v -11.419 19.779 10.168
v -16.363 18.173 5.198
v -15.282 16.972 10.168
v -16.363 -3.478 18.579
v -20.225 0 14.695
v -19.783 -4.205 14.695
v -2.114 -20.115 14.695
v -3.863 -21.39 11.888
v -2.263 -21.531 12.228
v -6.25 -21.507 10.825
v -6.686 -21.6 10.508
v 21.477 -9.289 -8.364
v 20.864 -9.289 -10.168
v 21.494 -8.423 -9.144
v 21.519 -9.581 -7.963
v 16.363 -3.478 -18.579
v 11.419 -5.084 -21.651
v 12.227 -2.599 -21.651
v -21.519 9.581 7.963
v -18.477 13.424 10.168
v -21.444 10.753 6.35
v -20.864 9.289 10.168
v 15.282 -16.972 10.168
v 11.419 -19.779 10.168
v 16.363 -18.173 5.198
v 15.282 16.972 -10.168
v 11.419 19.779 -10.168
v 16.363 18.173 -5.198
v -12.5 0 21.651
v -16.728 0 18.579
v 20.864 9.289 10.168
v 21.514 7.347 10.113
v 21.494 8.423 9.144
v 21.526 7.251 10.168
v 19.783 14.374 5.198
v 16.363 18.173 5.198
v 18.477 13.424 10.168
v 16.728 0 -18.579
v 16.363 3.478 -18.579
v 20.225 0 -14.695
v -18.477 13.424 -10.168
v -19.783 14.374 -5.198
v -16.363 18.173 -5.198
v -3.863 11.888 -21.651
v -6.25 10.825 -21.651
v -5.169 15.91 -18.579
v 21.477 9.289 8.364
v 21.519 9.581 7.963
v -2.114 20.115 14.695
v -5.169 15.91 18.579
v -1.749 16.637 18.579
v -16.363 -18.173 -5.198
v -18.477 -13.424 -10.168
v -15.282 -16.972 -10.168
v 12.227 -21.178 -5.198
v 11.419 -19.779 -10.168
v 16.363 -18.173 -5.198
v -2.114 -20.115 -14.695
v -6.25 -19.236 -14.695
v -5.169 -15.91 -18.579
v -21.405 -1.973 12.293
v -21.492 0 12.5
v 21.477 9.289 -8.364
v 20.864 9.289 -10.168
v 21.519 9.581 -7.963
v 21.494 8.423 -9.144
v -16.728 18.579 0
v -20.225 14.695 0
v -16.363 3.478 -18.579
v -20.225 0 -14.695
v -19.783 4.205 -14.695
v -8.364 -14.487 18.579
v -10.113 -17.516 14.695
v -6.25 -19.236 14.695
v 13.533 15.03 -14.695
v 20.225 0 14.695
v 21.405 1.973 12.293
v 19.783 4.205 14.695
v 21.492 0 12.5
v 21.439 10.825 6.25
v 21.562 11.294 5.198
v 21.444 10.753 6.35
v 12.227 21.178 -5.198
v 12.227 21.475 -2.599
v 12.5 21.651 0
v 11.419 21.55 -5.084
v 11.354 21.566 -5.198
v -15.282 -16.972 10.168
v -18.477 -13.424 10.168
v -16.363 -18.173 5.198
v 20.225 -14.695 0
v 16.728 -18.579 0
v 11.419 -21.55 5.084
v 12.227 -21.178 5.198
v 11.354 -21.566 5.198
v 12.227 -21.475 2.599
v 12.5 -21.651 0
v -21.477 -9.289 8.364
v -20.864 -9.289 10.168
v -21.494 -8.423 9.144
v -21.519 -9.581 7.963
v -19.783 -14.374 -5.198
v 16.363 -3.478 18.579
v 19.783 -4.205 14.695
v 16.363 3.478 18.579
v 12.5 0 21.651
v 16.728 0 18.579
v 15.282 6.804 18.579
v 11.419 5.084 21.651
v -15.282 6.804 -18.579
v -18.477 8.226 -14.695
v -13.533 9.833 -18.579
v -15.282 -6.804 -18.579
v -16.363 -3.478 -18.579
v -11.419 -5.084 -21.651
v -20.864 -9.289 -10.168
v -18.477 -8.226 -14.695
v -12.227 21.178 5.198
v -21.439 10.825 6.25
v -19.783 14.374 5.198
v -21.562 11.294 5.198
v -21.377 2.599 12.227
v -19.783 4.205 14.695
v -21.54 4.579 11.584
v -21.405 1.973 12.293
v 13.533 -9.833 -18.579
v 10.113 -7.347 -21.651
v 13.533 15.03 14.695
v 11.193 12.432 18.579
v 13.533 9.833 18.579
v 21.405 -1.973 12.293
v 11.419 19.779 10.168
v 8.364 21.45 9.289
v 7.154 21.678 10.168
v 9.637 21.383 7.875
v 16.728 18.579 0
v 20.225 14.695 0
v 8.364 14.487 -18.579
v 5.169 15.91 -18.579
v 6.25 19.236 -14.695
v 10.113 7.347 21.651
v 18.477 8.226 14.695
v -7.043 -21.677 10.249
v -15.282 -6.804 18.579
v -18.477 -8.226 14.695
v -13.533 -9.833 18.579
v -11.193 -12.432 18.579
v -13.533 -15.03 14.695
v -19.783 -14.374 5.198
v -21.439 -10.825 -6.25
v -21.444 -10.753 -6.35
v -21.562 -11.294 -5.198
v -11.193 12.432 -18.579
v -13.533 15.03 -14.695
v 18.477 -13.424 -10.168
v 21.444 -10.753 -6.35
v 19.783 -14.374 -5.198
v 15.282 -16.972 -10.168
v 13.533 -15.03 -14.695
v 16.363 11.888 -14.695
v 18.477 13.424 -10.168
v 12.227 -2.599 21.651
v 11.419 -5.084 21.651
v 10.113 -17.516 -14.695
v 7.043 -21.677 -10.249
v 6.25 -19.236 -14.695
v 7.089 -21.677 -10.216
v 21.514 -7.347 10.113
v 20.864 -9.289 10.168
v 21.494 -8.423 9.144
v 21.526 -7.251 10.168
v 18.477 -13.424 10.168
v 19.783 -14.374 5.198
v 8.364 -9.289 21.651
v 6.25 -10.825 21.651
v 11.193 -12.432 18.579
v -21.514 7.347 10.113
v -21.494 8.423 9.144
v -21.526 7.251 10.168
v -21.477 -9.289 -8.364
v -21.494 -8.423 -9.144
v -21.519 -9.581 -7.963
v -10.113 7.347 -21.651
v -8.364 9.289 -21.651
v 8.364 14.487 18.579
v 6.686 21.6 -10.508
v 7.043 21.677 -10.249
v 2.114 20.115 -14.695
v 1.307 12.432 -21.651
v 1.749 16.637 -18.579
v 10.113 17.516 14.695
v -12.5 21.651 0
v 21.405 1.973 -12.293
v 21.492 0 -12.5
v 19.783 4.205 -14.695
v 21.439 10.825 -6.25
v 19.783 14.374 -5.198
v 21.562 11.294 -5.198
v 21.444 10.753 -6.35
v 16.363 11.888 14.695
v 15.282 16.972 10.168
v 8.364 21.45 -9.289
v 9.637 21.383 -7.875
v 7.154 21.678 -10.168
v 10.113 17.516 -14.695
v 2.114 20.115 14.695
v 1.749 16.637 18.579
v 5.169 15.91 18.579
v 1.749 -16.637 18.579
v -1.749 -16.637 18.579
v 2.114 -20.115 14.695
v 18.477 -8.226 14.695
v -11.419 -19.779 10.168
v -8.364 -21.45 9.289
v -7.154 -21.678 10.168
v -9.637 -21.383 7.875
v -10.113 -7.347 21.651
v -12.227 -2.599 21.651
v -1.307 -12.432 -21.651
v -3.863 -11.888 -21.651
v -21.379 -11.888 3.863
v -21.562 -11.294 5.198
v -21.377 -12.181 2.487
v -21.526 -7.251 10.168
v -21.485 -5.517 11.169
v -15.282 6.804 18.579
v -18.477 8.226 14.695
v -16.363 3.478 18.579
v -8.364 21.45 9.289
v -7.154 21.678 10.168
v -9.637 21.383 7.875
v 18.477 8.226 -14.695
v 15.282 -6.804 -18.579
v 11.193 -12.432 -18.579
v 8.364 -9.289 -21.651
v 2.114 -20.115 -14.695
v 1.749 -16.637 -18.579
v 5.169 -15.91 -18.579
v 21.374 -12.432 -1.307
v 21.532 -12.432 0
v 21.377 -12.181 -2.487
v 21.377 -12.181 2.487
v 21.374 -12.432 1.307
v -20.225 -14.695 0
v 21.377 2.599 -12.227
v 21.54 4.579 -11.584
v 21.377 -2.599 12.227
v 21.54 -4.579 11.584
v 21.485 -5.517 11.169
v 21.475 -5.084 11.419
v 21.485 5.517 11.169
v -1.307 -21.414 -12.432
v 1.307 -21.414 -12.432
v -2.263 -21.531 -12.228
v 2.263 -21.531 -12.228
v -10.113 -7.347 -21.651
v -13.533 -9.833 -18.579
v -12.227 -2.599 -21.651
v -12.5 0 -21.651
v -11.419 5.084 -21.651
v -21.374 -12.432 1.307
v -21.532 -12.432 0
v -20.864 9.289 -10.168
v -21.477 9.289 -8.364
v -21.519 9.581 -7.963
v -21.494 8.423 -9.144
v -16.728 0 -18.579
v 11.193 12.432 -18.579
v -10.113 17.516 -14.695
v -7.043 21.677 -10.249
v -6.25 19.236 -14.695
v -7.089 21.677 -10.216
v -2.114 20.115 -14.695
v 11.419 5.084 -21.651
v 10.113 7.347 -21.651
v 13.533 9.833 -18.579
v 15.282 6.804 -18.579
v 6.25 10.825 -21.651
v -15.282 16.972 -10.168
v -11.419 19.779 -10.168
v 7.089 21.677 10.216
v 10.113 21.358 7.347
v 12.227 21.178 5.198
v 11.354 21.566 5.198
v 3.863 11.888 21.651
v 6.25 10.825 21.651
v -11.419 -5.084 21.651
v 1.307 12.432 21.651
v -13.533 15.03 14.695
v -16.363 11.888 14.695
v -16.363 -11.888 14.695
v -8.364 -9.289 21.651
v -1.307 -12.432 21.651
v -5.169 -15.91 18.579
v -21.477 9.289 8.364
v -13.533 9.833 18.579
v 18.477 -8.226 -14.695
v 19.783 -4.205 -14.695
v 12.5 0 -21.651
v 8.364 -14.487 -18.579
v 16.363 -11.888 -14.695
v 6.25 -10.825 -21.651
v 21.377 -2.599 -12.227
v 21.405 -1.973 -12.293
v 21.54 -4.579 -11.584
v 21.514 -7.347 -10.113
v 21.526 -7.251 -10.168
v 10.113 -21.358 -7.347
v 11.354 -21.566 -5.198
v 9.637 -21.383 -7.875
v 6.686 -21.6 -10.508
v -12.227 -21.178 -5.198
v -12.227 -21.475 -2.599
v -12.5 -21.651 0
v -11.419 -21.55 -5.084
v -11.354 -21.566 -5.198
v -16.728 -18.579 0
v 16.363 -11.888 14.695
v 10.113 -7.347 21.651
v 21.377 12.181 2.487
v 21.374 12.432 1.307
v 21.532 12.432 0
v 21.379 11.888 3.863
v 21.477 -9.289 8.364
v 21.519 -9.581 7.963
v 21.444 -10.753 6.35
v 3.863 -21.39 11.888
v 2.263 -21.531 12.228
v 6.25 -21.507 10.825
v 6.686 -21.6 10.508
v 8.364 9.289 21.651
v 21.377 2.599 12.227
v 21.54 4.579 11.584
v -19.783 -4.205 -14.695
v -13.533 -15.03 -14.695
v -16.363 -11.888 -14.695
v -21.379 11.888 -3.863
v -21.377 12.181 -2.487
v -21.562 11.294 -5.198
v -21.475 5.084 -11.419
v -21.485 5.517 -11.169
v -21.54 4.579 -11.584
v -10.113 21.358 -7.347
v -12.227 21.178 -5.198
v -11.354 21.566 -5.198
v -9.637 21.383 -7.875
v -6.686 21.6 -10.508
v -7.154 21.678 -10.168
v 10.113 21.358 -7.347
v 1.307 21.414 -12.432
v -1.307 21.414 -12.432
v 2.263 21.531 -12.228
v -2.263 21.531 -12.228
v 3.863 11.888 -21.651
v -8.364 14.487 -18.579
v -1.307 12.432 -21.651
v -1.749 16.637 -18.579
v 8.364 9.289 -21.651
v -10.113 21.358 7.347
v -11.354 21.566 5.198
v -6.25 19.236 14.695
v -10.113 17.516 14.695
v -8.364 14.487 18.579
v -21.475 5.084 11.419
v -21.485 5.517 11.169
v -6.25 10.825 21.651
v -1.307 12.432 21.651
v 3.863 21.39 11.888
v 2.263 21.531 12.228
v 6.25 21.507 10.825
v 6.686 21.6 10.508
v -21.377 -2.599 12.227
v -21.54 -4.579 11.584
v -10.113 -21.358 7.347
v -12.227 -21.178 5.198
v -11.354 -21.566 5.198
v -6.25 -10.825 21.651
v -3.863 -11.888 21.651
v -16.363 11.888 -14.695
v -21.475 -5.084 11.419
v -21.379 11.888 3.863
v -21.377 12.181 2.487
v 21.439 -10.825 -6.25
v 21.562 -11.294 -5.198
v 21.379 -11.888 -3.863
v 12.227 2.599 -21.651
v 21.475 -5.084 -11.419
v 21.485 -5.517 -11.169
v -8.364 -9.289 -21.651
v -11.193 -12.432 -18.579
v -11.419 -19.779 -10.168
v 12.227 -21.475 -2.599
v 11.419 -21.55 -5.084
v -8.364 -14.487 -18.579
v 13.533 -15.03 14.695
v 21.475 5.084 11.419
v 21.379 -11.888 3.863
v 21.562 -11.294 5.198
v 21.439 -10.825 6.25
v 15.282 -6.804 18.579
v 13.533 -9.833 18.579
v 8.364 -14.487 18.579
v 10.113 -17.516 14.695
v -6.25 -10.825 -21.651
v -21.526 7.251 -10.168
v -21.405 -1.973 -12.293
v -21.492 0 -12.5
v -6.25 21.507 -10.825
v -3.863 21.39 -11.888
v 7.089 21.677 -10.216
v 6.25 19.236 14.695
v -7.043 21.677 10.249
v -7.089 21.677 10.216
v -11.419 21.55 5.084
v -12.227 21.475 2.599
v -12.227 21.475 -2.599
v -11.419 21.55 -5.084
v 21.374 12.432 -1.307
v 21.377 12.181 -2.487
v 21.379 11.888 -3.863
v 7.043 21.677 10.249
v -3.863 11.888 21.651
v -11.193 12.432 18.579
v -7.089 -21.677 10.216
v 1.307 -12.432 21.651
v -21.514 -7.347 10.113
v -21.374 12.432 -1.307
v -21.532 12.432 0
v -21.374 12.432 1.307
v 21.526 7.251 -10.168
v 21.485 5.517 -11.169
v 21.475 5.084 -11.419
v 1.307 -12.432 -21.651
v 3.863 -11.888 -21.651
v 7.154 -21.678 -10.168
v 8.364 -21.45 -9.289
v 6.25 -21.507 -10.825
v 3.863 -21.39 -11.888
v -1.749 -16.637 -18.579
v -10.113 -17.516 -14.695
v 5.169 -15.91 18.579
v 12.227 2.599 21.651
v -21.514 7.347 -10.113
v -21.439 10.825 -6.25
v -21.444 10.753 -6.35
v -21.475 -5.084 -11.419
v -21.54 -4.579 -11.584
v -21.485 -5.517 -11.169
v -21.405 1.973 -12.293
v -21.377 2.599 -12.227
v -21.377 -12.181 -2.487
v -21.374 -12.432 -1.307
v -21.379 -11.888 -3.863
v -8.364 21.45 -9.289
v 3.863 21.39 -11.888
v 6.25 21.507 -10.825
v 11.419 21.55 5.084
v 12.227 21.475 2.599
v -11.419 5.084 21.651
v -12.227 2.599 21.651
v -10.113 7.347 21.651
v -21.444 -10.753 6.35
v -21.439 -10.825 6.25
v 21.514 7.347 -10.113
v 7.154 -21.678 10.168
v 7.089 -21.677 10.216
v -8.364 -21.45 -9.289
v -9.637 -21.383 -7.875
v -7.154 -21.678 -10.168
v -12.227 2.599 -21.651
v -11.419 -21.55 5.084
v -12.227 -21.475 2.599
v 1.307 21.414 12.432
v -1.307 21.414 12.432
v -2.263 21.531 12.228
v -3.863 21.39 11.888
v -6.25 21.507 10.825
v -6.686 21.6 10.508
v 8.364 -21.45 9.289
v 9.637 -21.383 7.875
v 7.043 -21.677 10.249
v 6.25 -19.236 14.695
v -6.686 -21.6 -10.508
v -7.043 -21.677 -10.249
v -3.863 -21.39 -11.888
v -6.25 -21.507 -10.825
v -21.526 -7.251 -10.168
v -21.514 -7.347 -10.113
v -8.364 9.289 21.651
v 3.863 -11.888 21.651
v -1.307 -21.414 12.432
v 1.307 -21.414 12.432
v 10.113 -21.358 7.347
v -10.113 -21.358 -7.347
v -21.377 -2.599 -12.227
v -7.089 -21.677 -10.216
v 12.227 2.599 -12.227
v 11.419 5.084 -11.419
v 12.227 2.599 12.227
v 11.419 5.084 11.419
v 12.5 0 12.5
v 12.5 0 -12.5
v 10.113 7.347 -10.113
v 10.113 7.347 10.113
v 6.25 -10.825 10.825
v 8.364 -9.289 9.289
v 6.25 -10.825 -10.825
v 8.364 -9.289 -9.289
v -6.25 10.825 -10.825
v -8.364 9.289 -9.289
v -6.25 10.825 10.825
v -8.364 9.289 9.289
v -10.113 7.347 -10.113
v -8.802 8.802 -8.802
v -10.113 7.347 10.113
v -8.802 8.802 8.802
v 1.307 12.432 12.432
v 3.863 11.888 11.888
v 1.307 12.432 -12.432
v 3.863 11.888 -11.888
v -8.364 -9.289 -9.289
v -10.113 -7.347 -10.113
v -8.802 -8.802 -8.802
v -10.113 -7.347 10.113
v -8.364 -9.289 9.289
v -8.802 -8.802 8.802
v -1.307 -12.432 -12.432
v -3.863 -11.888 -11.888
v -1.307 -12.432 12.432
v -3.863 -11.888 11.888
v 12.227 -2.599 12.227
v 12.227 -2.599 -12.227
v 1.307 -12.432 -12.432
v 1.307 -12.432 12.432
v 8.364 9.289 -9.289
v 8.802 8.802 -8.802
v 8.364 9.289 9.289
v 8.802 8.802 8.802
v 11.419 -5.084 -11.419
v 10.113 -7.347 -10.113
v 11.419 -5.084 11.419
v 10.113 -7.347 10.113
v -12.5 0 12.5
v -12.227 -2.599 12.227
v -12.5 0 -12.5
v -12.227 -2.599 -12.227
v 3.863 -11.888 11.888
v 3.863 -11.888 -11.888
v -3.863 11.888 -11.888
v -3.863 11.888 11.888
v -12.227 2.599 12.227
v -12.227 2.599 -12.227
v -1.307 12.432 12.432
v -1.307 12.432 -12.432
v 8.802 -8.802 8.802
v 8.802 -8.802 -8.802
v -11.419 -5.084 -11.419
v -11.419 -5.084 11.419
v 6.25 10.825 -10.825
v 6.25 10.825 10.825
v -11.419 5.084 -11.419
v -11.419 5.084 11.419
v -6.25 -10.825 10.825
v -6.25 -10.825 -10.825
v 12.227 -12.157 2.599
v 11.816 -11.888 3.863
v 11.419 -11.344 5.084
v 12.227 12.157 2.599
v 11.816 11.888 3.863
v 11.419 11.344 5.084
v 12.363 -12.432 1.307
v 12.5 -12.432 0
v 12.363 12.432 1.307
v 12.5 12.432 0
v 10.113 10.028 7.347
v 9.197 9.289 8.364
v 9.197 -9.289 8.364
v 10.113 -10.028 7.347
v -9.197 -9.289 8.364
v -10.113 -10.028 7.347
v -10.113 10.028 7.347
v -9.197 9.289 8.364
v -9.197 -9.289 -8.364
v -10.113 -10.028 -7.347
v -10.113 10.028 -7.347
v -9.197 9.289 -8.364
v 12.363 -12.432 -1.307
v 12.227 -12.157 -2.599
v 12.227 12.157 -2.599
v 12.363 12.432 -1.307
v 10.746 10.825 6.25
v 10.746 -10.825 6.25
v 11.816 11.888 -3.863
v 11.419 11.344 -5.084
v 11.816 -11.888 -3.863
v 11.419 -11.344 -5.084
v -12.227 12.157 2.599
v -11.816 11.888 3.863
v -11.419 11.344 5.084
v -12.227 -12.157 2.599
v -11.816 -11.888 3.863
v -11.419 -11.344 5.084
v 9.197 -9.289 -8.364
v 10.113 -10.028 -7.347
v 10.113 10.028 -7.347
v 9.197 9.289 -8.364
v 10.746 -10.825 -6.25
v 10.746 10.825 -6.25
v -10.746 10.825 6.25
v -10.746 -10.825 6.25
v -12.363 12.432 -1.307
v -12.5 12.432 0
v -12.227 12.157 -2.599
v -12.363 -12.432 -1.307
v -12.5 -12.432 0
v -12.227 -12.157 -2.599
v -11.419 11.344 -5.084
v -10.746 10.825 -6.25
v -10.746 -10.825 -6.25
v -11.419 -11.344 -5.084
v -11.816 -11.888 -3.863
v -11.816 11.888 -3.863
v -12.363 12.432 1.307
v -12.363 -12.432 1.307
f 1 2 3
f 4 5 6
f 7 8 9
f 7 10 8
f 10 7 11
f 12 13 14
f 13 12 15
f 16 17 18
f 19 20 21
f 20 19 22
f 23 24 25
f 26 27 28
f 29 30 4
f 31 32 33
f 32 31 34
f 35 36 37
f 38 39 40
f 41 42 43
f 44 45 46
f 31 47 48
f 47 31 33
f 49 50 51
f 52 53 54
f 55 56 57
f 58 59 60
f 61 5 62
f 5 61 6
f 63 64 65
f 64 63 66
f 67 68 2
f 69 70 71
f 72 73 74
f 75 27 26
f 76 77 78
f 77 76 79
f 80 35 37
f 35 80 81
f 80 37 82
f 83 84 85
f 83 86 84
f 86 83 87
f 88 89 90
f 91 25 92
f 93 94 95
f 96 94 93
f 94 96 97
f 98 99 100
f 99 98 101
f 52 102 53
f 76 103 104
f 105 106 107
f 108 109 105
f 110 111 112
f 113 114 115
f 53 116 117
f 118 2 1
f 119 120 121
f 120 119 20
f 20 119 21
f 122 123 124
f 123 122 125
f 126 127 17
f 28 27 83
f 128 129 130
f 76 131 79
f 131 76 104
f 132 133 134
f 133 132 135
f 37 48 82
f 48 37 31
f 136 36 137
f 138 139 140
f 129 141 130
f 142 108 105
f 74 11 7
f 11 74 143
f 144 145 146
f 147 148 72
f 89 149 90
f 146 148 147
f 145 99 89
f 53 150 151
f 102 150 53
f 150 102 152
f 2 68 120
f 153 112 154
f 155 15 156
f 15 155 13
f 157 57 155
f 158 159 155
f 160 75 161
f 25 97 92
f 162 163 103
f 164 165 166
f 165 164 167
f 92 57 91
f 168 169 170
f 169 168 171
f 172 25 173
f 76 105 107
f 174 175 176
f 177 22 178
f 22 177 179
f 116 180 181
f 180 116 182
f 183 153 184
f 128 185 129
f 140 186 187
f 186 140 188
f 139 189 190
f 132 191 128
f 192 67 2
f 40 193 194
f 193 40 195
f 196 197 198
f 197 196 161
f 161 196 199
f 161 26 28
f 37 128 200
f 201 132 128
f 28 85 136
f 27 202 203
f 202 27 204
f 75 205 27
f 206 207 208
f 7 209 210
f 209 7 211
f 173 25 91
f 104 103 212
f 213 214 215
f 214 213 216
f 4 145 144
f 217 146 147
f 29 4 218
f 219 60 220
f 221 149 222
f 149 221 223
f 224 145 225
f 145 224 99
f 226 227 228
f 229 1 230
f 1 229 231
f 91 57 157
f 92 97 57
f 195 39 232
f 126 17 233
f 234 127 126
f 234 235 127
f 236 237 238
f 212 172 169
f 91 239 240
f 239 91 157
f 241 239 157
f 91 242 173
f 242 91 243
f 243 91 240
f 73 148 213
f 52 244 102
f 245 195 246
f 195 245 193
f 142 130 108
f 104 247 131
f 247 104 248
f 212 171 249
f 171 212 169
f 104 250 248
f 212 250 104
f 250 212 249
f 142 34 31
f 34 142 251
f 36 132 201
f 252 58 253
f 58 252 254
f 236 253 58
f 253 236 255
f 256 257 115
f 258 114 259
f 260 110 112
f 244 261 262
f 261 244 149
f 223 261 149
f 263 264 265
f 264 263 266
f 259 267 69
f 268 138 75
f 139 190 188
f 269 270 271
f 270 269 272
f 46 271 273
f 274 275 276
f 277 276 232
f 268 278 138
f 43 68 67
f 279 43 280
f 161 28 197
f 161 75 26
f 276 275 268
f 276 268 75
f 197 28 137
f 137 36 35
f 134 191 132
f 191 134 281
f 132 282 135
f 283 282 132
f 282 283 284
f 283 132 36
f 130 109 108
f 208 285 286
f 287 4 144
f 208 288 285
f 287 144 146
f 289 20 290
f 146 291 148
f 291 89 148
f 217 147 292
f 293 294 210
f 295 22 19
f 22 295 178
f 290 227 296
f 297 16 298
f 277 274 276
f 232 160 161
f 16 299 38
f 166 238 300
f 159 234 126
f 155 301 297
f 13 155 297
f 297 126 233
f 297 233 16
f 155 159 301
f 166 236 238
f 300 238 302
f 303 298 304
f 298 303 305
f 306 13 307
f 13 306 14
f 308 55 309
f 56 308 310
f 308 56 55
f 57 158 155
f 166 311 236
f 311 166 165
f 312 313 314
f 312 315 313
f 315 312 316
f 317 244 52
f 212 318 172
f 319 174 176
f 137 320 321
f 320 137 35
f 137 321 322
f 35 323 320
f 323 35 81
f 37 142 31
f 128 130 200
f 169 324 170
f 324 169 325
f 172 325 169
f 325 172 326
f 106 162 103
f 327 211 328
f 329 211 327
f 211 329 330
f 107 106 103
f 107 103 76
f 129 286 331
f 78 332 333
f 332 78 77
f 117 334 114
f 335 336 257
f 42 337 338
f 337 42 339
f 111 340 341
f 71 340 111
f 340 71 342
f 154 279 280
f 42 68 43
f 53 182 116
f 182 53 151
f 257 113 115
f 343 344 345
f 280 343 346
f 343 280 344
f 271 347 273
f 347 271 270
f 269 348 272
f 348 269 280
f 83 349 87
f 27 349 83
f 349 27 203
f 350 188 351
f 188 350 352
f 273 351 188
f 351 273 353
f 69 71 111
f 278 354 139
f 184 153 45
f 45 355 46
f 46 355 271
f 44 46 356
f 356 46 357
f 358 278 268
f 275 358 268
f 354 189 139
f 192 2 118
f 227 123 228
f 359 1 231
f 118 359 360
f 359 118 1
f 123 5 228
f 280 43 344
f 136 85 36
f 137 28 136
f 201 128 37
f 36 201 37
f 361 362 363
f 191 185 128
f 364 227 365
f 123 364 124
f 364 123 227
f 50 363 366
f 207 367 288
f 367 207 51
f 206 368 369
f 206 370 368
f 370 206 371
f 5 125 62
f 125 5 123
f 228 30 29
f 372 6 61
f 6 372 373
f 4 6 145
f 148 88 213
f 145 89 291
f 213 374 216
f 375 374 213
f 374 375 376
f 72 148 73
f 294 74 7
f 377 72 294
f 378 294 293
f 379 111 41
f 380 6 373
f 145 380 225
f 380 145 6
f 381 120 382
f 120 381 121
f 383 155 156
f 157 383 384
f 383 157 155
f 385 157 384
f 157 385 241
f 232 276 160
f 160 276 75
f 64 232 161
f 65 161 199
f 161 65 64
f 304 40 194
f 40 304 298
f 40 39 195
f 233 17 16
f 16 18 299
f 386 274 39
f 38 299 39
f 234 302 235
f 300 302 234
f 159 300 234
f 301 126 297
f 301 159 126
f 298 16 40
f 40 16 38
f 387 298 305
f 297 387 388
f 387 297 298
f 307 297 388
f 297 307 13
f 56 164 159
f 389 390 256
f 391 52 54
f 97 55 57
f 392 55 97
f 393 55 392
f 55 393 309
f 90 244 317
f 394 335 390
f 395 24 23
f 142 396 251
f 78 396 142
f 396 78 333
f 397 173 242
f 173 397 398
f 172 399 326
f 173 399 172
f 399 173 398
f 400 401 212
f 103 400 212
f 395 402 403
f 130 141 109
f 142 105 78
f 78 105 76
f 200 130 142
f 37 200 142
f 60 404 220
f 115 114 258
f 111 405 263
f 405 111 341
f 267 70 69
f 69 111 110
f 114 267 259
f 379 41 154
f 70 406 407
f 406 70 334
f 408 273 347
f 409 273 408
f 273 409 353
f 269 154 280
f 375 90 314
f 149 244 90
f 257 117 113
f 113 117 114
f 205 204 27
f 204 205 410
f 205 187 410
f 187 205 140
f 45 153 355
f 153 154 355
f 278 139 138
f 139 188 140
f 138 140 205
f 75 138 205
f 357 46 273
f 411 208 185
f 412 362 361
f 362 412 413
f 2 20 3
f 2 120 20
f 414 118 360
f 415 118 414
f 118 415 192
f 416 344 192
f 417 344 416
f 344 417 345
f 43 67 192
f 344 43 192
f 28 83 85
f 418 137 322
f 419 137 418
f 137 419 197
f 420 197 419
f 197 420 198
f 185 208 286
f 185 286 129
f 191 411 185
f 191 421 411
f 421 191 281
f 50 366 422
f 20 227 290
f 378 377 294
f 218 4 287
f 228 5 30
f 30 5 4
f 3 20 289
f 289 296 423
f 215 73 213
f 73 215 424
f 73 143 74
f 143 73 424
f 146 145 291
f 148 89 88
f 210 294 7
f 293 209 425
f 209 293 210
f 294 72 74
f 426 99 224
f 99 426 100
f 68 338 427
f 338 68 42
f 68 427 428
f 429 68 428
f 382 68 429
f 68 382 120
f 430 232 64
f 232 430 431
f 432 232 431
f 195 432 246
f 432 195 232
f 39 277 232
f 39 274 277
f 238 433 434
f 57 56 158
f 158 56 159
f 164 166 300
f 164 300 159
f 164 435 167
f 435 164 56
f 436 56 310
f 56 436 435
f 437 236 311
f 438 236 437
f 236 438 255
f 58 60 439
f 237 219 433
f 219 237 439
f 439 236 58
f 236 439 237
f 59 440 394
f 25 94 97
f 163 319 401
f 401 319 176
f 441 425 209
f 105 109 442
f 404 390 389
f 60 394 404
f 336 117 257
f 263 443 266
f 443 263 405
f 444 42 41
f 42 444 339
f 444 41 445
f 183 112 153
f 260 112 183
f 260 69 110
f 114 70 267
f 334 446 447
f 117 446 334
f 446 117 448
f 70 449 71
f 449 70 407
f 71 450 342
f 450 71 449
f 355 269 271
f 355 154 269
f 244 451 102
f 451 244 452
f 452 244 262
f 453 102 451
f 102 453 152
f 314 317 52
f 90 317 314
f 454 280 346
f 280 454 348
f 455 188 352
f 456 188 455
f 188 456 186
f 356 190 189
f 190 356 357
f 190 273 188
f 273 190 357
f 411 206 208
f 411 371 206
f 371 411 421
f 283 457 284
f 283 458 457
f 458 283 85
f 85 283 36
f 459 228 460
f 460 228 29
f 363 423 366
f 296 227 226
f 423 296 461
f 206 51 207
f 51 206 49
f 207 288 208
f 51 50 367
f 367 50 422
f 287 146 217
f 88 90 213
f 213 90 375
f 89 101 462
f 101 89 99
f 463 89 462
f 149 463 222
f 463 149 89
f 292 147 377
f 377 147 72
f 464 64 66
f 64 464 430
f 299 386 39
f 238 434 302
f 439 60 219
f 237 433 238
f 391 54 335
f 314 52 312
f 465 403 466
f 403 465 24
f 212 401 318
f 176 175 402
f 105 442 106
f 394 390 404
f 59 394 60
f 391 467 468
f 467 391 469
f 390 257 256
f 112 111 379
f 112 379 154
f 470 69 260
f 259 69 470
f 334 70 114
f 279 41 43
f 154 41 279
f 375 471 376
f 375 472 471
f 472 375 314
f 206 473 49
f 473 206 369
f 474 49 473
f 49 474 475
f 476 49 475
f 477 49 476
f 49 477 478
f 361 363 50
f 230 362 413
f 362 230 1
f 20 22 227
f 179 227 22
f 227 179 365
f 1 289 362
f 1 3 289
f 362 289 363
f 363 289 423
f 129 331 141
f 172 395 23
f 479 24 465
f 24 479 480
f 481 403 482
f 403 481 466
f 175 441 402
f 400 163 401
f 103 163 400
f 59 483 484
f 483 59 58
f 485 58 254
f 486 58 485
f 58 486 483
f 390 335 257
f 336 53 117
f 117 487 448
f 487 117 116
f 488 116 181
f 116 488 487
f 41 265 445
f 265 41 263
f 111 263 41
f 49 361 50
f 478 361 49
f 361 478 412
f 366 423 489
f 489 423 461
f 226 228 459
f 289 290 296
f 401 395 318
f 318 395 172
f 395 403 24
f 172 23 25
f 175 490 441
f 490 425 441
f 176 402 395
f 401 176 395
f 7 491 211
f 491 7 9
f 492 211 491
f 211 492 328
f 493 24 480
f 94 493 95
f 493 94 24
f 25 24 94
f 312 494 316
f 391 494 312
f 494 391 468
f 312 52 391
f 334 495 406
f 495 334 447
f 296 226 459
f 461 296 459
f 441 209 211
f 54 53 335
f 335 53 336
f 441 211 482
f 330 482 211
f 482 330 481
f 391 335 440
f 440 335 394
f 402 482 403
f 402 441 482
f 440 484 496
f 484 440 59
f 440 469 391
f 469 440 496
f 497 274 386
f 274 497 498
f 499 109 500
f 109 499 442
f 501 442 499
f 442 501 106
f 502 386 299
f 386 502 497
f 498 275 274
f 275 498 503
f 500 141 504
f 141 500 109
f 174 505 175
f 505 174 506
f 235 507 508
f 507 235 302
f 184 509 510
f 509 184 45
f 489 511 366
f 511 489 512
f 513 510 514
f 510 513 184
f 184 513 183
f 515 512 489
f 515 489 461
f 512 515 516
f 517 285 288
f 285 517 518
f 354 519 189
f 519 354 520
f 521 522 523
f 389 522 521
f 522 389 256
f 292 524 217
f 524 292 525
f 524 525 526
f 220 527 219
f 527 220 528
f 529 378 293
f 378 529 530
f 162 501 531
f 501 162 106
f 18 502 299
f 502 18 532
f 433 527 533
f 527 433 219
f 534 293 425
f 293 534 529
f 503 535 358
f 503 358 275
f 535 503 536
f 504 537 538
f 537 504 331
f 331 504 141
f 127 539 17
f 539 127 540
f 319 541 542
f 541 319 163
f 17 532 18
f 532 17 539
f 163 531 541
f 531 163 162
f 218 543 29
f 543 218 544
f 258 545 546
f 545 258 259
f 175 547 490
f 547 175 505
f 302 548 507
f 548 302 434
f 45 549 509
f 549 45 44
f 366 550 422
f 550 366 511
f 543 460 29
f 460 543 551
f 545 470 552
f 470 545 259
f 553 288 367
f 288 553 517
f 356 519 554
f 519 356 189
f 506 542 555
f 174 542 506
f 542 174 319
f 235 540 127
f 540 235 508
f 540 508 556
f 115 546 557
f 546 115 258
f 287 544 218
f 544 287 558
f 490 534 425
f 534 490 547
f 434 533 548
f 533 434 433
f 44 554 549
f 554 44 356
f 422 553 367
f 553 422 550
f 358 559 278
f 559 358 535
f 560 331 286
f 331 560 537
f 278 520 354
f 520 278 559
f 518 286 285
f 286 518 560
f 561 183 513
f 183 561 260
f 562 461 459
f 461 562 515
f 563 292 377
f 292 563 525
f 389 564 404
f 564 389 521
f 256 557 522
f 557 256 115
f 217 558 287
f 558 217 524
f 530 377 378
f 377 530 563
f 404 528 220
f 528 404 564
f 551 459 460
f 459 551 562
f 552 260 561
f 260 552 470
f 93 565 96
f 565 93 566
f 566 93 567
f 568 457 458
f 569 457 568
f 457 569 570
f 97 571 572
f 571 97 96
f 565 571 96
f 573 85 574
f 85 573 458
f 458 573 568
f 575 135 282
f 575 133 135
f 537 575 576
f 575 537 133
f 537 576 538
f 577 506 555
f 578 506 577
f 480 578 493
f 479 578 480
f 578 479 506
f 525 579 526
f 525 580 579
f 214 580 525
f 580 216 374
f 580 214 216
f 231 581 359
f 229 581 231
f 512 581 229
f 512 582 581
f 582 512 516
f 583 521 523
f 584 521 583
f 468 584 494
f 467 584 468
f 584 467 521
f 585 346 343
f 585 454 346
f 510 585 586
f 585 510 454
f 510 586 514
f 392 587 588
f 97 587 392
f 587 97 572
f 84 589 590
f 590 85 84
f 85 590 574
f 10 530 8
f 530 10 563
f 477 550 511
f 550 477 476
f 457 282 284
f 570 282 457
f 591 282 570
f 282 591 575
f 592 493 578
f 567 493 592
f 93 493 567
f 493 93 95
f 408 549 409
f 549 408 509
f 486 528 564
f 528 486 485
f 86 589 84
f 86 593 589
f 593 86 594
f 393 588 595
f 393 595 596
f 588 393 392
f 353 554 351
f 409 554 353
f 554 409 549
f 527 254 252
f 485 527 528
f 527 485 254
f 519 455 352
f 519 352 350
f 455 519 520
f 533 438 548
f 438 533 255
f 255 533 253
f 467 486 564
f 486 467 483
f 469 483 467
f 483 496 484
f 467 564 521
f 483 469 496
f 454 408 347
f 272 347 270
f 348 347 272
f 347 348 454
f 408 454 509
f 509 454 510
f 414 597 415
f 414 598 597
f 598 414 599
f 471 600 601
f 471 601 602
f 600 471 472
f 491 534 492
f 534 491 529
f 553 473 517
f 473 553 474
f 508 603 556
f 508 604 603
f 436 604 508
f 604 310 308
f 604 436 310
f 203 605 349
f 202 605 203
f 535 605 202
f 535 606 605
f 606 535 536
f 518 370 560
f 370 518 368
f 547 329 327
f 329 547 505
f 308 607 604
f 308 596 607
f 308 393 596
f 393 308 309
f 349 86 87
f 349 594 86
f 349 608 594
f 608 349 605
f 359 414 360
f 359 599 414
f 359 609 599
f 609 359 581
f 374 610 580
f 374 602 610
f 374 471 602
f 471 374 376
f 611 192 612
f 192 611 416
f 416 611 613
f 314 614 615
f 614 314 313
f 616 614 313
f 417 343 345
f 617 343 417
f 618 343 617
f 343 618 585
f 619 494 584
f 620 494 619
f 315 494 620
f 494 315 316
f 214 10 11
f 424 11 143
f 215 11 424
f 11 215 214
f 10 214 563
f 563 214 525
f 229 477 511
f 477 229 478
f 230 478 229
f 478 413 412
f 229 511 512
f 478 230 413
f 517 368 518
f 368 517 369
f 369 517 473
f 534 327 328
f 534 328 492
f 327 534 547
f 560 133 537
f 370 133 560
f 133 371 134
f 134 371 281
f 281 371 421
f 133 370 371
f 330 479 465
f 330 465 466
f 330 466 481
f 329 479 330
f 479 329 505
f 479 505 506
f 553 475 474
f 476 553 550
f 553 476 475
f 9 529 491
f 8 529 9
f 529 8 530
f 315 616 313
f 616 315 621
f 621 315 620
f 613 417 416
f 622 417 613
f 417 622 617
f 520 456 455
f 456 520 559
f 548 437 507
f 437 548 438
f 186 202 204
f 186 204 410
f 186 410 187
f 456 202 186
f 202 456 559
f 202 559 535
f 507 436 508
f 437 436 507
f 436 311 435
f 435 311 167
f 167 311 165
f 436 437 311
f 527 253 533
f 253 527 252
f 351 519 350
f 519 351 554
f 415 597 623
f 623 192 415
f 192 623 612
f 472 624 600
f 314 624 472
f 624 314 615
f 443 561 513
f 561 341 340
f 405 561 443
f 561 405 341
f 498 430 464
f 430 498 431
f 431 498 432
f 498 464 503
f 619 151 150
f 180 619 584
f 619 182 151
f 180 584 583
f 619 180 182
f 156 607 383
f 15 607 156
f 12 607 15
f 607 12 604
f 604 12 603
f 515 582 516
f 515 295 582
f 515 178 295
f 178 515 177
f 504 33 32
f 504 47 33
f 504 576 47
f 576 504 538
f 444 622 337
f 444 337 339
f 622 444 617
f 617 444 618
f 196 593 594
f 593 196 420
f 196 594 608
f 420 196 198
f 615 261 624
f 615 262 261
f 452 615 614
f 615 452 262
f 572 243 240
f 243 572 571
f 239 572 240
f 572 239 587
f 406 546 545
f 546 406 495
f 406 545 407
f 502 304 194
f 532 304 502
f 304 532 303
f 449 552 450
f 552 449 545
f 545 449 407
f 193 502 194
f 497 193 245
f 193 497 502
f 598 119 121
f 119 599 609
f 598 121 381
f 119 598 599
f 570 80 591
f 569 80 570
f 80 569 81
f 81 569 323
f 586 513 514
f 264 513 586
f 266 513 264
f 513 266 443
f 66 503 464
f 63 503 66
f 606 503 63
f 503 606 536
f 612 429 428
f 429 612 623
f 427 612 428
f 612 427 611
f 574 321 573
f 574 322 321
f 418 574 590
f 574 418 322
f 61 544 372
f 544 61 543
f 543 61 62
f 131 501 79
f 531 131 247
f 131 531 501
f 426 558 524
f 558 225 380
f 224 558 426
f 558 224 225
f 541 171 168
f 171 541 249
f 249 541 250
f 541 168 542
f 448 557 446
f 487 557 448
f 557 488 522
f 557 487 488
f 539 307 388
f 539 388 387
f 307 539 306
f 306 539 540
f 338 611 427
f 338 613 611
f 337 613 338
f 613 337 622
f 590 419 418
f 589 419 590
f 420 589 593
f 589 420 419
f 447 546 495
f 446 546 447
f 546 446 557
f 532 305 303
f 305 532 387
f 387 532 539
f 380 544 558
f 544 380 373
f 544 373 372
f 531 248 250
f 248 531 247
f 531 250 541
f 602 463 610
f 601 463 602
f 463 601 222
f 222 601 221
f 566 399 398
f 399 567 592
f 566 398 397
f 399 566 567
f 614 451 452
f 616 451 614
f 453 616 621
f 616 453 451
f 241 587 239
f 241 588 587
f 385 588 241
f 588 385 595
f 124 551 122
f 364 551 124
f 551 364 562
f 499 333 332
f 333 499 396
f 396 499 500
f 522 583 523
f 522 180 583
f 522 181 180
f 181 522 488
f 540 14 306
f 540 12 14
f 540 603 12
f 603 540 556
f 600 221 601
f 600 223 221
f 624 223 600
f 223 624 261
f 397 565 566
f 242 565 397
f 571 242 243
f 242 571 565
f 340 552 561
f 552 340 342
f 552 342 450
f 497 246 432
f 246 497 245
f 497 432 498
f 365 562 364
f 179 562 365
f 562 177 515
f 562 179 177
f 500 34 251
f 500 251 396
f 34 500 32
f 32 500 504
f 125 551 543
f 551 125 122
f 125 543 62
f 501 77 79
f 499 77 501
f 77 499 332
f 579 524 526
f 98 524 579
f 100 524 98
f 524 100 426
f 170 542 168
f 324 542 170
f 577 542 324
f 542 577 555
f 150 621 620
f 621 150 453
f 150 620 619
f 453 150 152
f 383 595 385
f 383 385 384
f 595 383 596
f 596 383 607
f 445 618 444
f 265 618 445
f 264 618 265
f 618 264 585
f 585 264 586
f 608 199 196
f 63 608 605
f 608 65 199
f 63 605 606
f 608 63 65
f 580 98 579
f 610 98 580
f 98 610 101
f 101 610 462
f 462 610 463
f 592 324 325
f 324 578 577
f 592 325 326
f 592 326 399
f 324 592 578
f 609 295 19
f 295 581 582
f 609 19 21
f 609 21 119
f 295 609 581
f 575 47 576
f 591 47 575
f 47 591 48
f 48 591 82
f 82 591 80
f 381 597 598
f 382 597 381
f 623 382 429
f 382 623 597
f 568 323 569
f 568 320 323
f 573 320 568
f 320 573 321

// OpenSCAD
// Volume: 18241.62430352149, SurfaceArea: 9499.830262732949
module example001()
{
  function r_from_dia(d) = d / 2;

  module rotcy(rot, r, h) {
    rotate(90, rot)
      cylinder(r = r, h = h, center = true);
  }

  difference() {
    sphere(r = r_from_dia(size));
    rotcy([0, 0, 0], cy_r, cy_h);
    rotcy([1, 0, 0], cy_r, cy_h);
    rotcy([0, 1, 0], cy_r, cy_h);
  }

  size = 50;
  hole = 25;

  cy_r = r_from_dia(hole);
  cy_h = r_from_dia(size * 2.5);
}

echo(version=version());

example001();

// Written by Clifford Wolf <clifford@clifford.at> and Marius
// Kintel <marius@kintel.net>
//
// To the extent possible under law, the author(s) have dedicated all
// copyright and related and neighboring rights to this software to the
// public domain worldwide. This software is distributed without any
// warranty.
//
// You should have received a copy of the CC0 Public Domain
// Dedication along with this software.
// If not, see <http://creativecommons.org/publicdomain/zero/1.0/>.
